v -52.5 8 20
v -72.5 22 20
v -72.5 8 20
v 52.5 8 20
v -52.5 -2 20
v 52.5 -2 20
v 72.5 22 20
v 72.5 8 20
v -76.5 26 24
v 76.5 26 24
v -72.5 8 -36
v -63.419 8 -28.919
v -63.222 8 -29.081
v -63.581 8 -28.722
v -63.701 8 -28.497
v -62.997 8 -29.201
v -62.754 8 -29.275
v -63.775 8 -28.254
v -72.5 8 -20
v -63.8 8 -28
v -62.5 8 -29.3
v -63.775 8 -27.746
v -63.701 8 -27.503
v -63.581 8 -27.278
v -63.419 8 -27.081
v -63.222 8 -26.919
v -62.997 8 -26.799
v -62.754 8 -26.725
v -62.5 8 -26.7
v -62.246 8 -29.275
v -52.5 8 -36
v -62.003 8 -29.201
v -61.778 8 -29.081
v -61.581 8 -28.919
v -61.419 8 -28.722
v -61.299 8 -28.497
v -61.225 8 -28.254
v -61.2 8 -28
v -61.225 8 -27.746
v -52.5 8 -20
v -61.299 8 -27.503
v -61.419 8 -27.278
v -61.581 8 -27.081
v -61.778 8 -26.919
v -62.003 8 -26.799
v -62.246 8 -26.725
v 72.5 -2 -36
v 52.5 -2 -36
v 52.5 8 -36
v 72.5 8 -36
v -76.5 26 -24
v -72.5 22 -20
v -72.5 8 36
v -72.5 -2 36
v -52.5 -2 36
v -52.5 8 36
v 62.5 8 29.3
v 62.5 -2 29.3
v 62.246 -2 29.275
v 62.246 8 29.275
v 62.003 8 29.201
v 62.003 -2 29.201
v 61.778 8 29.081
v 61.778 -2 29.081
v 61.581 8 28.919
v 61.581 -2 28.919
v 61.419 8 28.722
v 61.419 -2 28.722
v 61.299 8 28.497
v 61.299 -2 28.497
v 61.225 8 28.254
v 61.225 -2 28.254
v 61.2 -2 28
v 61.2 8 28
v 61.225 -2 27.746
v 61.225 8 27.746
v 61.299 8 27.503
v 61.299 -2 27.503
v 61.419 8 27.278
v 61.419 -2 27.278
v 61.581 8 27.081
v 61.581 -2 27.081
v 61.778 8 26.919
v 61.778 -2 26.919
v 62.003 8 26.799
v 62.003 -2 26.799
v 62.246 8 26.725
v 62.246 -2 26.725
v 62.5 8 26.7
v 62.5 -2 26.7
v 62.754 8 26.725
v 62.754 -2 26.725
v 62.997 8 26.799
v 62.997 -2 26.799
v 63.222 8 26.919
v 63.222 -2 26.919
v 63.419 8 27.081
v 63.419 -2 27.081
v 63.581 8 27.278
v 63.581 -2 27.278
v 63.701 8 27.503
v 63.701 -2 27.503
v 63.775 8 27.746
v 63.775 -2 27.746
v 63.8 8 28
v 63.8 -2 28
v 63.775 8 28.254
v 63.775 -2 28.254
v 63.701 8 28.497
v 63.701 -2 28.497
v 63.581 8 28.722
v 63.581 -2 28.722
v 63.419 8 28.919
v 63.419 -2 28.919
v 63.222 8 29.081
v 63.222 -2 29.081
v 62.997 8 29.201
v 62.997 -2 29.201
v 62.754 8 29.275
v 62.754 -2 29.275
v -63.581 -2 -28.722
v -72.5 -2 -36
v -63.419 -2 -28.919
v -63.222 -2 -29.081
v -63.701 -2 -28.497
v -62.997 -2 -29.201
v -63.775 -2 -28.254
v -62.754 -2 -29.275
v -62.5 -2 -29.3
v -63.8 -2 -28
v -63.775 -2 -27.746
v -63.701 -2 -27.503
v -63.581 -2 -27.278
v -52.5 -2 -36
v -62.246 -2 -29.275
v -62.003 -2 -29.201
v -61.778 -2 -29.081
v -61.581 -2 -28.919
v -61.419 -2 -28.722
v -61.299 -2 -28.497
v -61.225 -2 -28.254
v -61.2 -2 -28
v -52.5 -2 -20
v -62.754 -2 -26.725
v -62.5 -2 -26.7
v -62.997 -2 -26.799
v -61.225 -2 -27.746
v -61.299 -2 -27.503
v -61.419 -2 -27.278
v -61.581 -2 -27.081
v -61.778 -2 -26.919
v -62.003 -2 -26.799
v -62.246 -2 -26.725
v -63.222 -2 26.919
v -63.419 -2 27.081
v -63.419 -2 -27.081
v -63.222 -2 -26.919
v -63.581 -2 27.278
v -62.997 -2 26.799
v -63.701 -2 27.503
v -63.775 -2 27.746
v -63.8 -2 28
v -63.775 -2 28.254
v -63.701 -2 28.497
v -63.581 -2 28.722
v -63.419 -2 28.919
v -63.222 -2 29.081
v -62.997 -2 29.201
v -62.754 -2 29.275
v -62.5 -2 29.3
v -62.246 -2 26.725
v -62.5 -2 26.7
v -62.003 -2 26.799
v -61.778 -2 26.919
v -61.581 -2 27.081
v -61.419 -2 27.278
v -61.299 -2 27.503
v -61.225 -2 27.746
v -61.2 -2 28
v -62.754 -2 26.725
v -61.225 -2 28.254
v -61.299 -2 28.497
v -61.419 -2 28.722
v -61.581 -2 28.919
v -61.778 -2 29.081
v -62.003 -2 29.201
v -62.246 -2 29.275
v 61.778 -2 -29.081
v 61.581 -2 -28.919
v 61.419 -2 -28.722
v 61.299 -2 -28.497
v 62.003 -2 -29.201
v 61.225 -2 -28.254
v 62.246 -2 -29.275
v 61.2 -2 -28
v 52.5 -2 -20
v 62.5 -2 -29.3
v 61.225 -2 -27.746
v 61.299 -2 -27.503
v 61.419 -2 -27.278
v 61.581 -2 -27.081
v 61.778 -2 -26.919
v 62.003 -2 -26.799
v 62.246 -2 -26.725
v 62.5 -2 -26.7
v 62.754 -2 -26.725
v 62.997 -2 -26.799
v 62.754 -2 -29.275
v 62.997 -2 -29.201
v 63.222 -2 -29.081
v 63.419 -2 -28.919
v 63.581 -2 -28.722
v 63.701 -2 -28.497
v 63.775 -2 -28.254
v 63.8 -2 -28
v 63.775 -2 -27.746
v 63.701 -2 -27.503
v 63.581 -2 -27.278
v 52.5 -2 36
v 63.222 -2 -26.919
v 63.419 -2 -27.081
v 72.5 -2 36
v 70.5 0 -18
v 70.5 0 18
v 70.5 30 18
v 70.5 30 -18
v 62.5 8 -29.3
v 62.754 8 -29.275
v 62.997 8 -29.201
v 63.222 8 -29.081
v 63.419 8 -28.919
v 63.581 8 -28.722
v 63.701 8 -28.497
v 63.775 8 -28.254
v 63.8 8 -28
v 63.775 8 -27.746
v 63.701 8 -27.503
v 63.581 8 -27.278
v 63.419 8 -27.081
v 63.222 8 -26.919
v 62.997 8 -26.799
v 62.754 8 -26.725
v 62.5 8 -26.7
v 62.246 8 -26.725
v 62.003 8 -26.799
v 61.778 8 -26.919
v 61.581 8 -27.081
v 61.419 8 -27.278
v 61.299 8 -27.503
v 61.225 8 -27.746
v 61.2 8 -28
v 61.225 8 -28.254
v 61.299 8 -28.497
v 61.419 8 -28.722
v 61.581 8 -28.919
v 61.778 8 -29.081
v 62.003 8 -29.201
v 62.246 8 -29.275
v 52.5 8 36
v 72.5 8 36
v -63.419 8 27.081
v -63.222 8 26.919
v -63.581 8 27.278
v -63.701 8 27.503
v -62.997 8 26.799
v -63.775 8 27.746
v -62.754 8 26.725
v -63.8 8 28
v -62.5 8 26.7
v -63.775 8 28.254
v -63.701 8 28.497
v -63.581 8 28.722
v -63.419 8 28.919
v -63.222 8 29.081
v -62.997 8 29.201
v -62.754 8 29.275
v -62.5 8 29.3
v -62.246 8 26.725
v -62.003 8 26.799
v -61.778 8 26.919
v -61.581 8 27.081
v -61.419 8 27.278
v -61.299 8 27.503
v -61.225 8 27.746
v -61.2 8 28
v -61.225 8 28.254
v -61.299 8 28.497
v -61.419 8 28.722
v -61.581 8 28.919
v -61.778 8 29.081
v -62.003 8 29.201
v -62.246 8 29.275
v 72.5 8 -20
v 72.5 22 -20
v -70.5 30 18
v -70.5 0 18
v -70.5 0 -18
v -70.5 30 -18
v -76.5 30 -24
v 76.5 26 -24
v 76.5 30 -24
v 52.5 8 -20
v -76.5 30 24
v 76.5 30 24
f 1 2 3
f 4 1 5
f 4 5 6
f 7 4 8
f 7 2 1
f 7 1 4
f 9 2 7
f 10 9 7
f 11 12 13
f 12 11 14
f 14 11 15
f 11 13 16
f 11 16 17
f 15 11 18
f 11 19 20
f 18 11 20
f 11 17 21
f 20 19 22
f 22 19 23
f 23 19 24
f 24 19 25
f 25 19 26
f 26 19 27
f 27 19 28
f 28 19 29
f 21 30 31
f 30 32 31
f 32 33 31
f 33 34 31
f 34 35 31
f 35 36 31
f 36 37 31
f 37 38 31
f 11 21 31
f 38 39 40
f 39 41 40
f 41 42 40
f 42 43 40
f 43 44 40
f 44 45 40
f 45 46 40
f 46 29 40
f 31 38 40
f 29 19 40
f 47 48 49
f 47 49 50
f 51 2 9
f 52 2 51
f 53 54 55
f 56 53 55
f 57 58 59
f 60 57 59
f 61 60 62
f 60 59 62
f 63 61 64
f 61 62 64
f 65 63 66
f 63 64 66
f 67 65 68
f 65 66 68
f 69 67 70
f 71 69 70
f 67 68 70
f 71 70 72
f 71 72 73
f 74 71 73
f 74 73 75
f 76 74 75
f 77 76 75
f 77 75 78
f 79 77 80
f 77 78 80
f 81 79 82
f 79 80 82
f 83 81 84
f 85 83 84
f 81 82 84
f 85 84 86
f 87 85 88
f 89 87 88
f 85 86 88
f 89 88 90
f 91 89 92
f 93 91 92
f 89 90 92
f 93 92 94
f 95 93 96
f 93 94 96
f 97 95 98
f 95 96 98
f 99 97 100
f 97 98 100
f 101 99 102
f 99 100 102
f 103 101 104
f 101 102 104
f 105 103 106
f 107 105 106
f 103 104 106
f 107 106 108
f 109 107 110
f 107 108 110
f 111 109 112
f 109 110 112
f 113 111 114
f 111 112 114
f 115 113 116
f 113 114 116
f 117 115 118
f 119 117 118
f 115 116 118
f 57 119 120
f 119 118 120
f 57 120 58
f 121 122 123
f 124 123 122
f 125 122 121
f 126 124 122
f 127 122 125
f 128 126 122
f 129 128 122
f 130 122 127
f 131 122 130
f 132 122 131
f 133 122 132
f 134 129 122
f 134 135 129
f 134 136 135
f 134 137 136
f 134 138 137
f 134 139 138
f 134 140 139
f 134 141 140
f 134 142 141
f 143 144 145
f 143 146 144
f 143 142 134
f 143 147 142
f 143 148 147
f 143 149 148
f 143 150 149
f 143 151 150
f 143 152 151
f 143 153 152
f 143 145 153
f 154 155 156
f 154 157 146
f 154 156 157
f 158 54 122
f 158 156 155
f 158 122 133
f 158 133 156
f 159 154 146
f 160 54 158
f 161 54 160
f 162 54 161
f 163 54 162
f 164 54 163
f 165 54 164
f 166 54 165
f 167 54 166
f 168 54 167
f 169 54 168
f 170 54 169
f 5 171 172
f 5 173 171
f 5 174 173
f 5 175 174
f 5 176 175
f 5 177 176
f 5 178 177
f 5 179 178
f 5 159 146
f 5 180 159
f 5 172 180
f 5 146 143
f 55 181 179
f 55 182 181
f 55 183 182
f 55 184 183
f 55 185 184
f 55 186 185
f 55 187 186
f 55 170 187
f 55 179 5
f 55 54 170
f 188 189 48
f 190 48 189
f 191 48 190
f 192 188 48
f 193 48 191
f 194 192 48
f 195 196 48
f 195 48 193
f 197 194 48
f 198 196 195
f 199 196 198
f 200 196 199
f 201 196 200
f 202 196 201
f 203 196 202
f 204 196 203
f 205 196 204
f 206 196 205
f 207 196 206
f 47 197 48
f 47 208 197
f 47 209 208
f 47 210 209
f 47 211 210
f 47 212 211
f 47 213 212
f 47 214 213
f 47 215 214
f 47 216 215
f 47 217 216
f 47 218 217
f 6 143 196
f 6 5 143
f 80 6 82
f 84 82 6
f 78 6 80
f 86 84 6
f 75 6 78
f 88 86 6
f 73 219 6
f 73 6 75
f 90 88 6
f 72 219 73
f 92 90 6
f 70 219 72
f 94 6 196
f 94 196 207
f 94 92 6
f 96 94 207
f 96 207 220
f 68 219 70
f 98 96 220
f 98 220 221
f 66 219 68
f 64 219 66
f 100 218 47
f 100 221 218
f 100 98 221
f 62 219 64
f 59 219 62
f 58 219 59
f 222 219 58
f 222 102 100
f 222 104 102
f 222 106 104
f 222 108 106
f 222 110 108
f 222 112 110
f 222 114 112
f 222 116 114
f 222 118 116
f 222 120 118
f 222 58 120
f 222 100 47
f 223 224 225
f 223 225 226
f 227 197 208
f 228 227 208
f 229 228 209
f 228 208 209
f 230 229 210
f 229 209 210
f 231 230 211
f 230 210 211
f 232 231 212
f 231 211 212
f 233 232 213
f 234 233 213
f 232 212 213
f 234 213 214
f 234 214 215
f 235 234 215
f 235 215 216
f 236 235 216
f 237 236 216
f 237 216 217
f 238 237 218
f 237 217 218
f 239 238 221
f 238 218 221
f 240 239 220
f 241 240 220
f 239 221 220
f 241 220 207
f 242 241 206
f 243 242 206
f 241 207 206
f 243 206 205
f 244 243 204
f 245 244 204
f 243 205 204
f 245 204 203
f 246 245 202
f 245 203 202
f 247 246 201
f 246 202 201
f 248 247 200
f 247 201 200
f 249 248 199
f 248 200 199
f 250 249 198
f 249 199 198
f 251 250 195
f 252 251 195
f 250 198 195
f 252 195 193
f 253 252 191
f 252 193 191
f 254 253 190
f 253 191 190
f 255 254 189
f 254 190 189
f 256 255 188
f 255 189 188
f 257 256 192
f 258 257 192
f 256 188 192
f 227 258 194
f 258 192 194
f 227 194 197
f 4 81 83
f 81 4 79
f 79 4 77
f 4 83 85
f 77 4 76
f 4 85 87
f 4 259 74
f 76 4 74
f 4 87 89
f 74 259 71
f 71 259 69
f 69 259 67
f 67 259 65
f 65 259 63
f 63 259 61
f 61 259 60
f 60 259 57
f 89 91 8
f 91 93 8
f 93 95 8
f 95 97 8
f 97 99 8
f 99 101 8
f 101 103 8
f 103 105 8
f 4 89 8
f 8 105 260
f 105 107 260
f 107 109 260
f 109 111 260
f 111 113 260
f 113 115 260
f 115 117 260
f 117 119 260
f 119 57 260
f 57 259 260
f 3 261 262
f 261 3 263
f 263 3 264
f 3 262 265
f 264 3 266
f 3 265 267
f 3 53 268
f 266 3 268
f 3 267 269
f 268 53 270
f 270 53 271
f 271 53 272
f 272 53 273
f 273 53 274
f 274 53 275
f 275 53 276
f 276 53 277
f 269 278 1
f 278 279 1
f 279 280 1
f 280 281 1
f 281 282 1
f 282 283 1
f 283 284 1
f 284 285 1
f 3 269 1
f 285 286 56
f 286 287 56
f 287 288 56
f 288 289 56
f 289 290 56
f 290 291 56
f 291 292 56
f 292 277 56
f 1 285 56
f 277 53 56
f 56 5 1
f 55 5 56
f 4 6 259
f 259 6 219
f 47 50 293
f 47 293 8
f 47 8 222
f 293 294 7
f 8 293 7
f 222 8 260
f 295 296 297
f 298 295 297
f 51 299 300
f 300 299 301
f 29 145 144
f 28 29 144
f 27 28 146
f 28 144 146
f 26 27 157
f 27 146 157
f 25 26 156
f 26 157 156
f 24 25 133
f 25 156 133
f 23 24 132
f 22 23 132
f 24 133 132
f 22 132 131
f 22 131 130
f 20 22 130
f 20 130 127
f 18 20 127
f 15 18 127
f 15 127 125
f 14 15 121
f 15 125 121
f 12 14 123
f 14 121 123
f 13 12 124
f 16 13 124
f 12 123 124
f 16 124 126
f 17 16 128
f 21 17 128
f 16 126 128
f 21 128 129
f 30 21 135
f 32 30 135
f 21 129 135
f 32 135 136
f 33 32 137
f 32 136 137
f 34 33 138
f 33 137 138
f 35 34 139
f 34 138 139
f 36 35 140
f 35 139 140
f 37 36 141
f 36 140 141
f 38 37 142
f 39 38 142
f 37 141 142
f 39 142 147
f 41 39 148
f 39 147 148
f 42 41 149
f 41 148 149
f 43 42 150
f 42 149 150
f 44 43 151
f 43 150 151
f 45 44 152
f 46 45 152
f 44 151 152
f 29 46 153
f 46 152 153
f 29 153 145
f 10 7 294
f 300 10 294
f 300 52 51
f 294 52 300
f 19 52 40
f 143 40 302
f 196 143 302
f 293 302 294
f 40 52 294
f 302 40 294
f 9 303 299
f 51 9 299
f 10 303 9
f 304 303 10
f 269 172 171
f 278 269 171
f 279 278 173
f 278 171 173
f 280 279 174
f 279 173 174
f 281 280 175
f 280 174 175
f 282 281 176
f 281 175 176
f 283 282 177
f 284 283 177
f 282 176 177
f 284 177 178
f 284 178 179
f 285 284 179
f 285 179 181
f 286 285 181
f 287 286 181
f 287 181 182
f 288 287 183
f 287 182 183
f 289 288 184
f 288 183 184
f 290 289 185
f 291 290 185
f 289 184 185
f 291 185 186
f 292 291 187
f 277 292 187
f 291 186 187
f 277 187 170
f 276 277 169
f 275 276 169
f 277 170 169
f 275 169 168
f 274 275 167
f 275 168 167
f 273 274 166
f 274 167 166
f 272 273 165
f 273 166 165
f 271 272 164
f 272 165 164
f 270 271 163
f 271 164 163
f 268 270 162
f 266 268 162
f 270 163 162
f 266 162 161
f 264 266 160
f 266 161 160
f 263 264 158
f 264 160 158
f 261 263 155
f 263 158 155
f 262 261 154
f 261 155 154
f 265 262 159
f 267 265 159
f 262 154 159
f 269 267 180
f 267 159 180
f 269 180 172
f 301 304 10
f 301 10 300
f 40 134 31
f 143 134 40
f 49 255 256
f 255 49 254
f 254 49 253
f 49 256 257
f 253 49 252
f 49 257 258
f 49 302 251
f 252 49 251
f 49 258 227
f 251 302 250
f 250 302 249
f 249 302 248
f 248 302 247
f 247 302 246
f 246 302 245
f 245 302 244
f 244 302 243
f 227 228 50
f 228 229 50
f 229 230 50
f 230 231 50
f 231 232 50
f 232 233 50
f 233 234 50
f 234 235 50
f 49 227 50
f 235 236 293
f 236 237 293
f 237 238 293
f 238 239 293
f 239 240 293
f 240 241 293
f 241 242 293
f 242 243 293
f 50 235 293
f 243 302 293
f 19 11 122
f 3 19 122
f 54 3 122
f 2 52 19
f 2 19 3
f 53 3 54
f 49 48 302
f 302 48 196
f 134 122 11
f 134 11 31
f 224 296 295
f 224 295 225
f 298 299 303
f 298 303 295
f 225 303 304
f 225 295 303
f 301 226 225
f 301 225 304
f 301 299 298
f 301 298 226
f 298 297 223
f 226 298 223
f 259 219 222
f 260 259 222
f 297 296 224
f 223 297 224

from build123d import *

# Parameters (mm, degrees)
SKETCH1_W           = 145
SKETCH1_H           = 40
SKETCH1_W_2         = 141
SKETCH1_H_2         = 36
BOSS_EXTRUDE1_DEPTH = 30
SKETCH2_W           = 145
SKETCH2_H           = 40
BOSS_EXTRUDE2_DEPTH = 2
SKETCH3_W           = 153
SKETCH3_H           = 48
SKETCH3_W_2         = 145
SKETCH3_H_2         = 40
BOSS_EXTRUDE3_DEPTH = 4
CHAMFER1_SIZE       = 4
SKETCH4_W           = 20
SKETCH4_H           = 16
SKETCH4_R           = 1.3
BOSS_EXTRUDE4_DEPTH = 10


with BuildPart() as part:
    # Sketch1 → Boss-Extrude1 (new body)
    with BuildSketch(Plane(origin=(0, 0, 0), x_dir=(1, 0, 0), z_dir=(0, 1, 0))):
        Rectangle(SKETCH1_W, SKETCH1_H)
        Rectangle(SKETCH1_W_2, SKETCH1_H_2, mode=Mode.SUBTRACT)
    extrude(amount=BOSS_EXTRUDE1_DEPTH)

    # Sketch2 → Boss-Extrude2 (add)
    with BuildSketch(Plane.XZ):
        Rectangle(SKETCH2_W, SKETCH2_H)
    extrude(amount=BOSS_EXTRUDE2_DEPTH)

    # Sketch3 → Boss-Extrude3 (add)
    with BuildSketch(Plane(origin=(0, 30, 0), x_dir=(1, 0, 0), z_dir=(0, 1, 0))):
        Rectangle(SKETCH3_W, SKETCH3_H)
        Rectangle(SKETCH3_W_2, SKETCH3_H_2, mode=Mode.SUBTRACT)
    extrude(amount=-BOSS_EXTRUDE3_DEPTH)

    # Chamfer1
    chamfer1_edges = [part.edges().sort_by_distance(p)[0] for p in [
        (-72.5, 26, 0),
        (0, 26, 20),
        (72.5, 26, 0),
        (0, 26, -20),
    ]]
    chamfer(chamfer1_edges, length=CHAMFER1_SIZE - 0.0001)  # a hair under: the kernel refuses the full size

    # Sketch4 → Boss-Extrude4 (add)
    # profile 1 of 4: a face of its own
    with BuildSketch(Plane.XZ.offset(2)):
        with Locations((62.5, 28)):
            Rectangle(SKETCH4_W, SKETCH4_H)
        with Locations(Location((62.5, 28, 0), (0, 0, 90))):
            Circle(SKETCH4_R, mode=Mode.SUBTRACT)
    # profile 2 of 4: a face of its own
    with BuildSketch(Plane.XZ.offset(2)):
        with Locations((-62.5, 28)):
            Rectangle(SKETCH4_W, SKETCH4_H)
        with Locations(Location((-62.5, 28, 0), (0, 0, 270))):
            Circle(SKETCH4_R, mode=Mode.SUBTRACT)
    # profile 3 of 4: a face of its own
    with BuildSketch(Plane.XZ.offset(2)):
        with Locations((-62.5, -28)):
            Rectangle(SKETCH4_W, SKETCH4_H)
        with Locations(Location((-62.5, -28, 0), (0, 0, 90))):
            Circle(SKETCH4_R, mode=Mode.SUBTRACT)
    # profile 4 of 4: a face of its own
    with BuildSketch(Plane.XZ.offset(2)):
        with Locations((62.5, -28)):
            Rectangle(SKETCH4_W, SKETCH4_H)
        with Locations(Location((62.5, -28, 0), (0, 0, 270))):
            Circle(SKETCH4_R, mode=Mode.SUBTRACT)
    extrude(amount=-BOSS_EXTRUDE4_DEPTH)


solid = part.part
